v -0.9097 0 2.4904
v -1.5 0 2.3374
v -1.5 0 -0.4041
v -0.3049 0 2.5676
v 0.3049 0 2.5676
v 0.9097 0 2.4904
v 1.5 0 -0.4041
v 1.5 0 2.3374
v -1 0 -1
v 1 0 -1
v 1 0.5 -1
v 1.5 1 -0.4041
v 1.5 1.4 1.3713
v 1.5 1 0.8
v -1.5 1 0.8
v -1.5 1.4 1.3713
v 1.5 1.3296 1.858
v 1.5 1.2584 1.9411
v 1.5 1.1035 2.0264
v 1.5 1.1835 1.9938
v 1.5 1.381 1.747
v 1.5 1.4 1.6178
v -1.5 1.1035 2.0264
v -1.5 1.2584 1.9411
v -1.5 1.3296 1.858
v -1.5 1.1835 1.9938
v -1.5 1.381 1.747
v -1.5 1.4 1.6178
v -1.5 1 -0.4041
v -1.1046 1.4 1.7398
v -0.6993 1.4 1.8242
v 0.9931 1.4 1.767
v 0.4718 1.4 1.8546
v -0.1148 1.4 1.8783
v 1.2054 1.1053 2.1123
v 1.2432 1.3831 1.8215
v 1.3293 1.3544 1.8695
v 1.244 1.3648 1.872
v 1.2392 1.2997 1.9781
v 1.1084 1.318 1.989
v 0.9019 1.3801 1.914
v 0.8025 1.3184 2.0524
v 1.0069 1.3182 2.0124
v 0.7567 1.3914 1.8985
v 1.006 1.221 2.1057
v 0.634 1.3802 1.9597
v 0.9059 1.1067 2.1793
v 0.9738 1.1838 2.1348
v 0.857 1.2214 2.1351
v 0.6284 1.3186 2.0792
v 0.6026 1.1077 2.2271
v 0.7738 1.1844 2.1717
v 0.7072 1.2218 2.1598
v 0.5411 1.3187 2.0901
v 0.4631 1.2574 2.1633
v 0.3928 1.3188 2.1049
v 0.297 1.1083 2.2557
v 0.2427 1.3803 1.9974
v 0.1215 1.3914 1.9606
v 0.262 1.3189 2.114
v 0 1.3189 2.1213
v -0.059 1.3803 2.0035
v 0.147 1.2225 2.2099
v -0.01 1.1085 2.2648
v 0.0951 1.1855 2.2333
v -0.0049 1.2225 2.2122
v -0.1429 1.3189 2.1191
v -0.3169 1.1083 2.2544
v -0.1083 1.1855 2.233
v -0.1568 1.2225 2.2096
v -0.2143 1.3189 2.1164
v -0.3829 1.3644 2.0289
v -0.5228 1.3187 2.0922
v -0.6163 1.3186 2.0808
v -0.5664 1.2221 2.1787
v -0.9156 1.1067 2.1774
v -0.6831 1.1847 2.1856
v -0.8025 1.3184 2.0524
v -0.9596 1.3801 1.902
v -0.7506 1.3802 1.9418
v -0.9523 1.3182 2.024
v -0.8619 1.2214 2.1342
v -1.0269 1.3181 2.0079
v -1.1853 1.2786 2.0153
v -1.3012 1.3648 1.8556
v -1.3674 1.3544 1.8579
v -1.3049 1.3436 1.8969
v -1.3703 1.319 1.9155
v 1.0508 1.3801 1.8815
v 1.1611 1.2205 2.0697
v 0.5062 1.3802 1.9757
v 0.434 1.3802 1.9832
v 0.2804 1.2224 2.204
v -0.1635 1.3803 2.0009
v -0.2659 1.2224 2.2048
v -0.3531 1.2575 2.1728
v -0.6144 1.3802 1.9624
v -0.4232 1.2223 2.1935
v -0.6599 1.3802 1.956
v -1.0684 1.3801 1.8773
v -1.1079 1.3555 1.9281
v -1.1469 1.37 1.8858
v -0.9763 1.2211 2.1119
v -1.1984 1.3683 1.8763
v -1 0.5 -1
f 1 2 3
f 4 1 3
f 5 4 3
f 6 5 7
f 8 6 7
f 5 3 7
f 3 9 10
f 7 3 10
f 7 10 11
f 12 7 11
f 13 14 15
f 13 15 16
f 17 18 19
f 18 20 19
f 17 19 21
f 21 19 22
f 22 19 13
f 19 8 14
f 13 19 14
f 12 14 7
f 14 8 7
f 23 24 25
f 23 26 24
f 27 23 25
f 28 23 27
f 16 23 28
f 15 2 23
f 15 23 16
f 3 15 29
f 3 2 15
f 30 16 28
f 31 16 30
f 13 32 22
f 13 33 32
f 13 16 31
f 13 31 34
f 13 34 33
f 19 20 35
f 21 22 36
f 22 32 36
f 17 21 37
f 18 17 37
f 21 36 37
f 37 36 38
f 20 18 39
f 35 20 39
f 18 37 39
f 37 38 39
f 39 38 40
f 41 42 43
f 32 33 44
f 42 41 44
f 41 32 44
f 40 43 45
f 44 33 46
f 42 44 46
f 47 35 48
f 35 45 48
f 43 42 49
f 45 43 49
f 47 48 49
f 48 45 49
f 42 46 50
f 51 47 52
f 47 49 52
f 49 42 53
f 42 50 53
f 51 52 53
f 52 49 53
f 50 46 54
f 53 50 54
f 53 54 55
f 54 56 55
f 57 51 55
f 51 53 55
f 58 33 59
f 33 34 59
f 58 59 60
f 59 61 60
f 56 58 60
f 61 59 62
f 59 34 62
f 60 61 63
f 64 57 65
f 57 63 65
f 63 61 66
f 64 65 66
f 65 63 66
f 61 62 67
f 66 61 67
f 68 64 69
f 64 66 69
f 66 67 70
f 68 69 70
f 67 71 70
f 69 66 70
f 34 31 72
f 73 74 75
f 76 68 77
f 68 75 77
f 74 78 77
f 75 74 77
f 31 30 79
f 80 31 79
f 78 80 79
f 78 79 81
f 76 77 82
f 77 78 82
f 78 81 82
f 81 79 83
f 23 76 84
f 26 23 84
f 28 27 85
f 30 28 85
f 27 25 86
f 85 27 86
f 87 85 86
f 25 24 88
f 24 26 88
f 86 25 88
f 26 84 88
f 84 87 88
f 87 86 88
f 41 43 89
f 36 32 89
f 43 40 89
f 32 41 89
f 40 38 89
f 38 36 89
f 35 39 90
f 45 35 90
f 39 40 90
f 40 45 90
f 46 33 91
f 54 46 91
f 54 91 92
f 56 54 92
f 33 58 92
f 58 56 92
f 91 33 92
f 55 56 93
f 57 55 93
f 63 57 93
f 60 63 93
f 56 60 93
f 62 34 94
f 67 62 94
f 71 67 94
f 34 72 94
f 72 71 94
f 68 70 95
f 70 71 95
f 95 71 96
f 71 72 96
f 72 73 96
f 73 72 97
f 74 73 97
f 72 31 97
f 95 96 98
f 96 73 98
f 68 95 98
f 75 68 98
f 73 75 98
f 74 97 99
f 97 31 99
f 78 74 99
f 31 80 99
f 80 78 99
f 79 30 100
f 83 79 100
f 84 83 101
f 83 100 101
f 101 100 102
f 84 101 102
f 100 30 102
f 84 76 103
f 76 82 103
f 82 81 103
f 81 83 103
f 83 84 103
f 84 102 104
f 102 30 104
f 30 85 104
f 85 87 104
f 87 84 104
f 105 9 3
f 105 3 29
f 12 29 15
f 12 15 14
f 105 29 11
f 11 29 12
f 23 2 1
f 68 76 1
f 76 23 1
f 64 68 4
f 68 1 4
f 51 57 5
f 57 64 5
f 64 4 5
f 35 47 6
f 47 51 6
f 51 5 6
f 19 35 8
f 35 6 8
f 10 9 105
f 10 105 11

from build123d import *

# Parameters (mm, degrees)
SKETCH_1_W          = 3
SKETCH_1_H          = 3.8
EXTRUDE_1_DEPTH     = 1
SKETCH_2_W          = 3
SKETCH_2_H          = 2
EXTRUDE_2_DEPTH     = 1
CHAMFER_1_SIZE      = 0.5
CHAMFER_1_SIZE2     = 0.595876796
CHAMFER_3_SIZE      = 1
CHAMFER_3_SIZE_2    = 1.428148007
CUT_EXTRUDE_1_DEPTH = 3.4
CUT_EXTRUDE_START   = 0.4
SKETCH_7_W          = 5.415057917
SKETCH_7_H          = 3.835149715
CUT_EXTRUDE_2_DEPTH = 3.4
FILLET_1_R          = 0.4


with BuildPart() as part:
    # 草图1 → 凸台-拉伸1 (new body)
    with BuildSketch(Plane(origin=(0, 0, 0), x_dir=(1, 0, 0), z_dir=(0, 1, 0))):
        with Locations((0, -0.9)):
            Rectangle(SKETCH_1_W, SKETCH_1_H)
    extrude(amount=EXTRUDE_1_DEPTH)

    # 草图2 → 凸台-拉伸2 (add)
    with BuildSketch(Plane(origin=(0, 1, 0), x_dir=(1, 0, 0), z_dir=(0, 1, 0))):
        with Locations((0, -1.8)):
            Rectangle(SKETCH_2_W, SKETCH_2_H)
    extrude(amount=EXTRUDE_2_DEPTH)

    # 倒角1
    chamfer_1_edges = [part.edges().sort_by_distance(p)[0] for p in [
        (0, 1, -1),
        (-1.5, 0.5, -1),
        (1.5, 0.5, -1),
    ]]
    chamfer_1_side = [part.faces().sort_by_distance(p)[0] for p in [
        (0, 0.5, -1),
    ]]
    chamfer(chamfer_1_edges, length=CHAMFER_1_SIZE, length2=CHAMFER_1_SIZE2, reference=chamfer_1_side[0])

    # 倒角3
    # the kernel refuses this chamfer: 1.428148007, 1 mm, written as the material it takes off along each edge
    with BuildSketch(Plane(origin=(5.18826682, 2, 0.8), x_dir=(0, -0.9989750717851554, -0.04526373771402124), z_dir=(-1, 0, 0))) as chamfer_3_piece_1_section:
        Polygon((CHAMFER_3_SIZE * 0.998975071785, CHAMFER_3_SIZE * 0.045263737714), (-CHAMFER_3_SIZE_2 * 0.0452637377058, CHAMFER_3_SIZE_2 * 0.998975071605), (0, 0), align=None)
    chamfer_3_piece_1 = extrude(amount=10.37653364, mode=Mode.PRIVATE)
    chamfer_3_piece_1 = split(chamfer_3_piece_1, bisect_by=Plane(origin=(0, 1, 1.276872226), z_dir=(0, 1, 0)), keep=Keep.TOP, mode=Mode.PRIVATE)
    add(chamfer_3_piece_1, mode=Mode.SUBTRACT)

    # 草图4 → 切除-拉伸1 (cut, along a direction that is not the sketch's normal)
    with BuildSketch(Plane.XZ):
        with BuildLine():
            Line((1.59999292, 2.303360359), (2.090500244, 2.793867684))
            Line((2.090500244, 2.793867684), (1.735885254, 4.087234068))
            Line((1.735885254, 4.087234068), (1.71936645, 4.089830446))
            Line((1.71936645, 4.089830446), (-1.672891968, 4.089830446))
            Line((-1.672891968, 4.089830446), (-1.91054636, 3.486179043))
            Line((-1.91054636, 3.486179043), (-2.191031794, 2.570257584))
            Line((-2.191031794, 2.570257584), (-1.60000708, 2.303360359))
            ThreePointArc((-1.60000708, 2.303360359), (-7.08e-06, 2.577223661), (1.59999292, 2.303360359))
        make_face()
    extrude(amount=-CUT_EXTRUDE_1_DEPTH, dir=(0, -0.9625068420560824, 0.27125740357680156), mode=Mode.SUBTRACT)

    # 草图7 → 切除-拉伸2 (cut)
    with BuildSketch(Plane(origin=(0, 1, 0), x_dir=(1, 0, 0), z_dir=(0, 1, 0)).offset(CUT_EXTRUDE_START)):
        with Locations((0.008843871, -1.614836942)):
            Rectangle(SKETCH_7_W, SKETCH_7_H)
    extrude(amount=CUT_EXTRUDE_2_DEPTH, mode=Mode.SUBTRACT)

    # 圆角1
    fillet_1_edges = [part.edges().sort_by_distance(p)[0] for p in [
        (3.79e-07, 1.4, 2.182670242),
    ]]
    fillet(fillet_1_edges, radius=FILLET_1_R)


solid = part.part
